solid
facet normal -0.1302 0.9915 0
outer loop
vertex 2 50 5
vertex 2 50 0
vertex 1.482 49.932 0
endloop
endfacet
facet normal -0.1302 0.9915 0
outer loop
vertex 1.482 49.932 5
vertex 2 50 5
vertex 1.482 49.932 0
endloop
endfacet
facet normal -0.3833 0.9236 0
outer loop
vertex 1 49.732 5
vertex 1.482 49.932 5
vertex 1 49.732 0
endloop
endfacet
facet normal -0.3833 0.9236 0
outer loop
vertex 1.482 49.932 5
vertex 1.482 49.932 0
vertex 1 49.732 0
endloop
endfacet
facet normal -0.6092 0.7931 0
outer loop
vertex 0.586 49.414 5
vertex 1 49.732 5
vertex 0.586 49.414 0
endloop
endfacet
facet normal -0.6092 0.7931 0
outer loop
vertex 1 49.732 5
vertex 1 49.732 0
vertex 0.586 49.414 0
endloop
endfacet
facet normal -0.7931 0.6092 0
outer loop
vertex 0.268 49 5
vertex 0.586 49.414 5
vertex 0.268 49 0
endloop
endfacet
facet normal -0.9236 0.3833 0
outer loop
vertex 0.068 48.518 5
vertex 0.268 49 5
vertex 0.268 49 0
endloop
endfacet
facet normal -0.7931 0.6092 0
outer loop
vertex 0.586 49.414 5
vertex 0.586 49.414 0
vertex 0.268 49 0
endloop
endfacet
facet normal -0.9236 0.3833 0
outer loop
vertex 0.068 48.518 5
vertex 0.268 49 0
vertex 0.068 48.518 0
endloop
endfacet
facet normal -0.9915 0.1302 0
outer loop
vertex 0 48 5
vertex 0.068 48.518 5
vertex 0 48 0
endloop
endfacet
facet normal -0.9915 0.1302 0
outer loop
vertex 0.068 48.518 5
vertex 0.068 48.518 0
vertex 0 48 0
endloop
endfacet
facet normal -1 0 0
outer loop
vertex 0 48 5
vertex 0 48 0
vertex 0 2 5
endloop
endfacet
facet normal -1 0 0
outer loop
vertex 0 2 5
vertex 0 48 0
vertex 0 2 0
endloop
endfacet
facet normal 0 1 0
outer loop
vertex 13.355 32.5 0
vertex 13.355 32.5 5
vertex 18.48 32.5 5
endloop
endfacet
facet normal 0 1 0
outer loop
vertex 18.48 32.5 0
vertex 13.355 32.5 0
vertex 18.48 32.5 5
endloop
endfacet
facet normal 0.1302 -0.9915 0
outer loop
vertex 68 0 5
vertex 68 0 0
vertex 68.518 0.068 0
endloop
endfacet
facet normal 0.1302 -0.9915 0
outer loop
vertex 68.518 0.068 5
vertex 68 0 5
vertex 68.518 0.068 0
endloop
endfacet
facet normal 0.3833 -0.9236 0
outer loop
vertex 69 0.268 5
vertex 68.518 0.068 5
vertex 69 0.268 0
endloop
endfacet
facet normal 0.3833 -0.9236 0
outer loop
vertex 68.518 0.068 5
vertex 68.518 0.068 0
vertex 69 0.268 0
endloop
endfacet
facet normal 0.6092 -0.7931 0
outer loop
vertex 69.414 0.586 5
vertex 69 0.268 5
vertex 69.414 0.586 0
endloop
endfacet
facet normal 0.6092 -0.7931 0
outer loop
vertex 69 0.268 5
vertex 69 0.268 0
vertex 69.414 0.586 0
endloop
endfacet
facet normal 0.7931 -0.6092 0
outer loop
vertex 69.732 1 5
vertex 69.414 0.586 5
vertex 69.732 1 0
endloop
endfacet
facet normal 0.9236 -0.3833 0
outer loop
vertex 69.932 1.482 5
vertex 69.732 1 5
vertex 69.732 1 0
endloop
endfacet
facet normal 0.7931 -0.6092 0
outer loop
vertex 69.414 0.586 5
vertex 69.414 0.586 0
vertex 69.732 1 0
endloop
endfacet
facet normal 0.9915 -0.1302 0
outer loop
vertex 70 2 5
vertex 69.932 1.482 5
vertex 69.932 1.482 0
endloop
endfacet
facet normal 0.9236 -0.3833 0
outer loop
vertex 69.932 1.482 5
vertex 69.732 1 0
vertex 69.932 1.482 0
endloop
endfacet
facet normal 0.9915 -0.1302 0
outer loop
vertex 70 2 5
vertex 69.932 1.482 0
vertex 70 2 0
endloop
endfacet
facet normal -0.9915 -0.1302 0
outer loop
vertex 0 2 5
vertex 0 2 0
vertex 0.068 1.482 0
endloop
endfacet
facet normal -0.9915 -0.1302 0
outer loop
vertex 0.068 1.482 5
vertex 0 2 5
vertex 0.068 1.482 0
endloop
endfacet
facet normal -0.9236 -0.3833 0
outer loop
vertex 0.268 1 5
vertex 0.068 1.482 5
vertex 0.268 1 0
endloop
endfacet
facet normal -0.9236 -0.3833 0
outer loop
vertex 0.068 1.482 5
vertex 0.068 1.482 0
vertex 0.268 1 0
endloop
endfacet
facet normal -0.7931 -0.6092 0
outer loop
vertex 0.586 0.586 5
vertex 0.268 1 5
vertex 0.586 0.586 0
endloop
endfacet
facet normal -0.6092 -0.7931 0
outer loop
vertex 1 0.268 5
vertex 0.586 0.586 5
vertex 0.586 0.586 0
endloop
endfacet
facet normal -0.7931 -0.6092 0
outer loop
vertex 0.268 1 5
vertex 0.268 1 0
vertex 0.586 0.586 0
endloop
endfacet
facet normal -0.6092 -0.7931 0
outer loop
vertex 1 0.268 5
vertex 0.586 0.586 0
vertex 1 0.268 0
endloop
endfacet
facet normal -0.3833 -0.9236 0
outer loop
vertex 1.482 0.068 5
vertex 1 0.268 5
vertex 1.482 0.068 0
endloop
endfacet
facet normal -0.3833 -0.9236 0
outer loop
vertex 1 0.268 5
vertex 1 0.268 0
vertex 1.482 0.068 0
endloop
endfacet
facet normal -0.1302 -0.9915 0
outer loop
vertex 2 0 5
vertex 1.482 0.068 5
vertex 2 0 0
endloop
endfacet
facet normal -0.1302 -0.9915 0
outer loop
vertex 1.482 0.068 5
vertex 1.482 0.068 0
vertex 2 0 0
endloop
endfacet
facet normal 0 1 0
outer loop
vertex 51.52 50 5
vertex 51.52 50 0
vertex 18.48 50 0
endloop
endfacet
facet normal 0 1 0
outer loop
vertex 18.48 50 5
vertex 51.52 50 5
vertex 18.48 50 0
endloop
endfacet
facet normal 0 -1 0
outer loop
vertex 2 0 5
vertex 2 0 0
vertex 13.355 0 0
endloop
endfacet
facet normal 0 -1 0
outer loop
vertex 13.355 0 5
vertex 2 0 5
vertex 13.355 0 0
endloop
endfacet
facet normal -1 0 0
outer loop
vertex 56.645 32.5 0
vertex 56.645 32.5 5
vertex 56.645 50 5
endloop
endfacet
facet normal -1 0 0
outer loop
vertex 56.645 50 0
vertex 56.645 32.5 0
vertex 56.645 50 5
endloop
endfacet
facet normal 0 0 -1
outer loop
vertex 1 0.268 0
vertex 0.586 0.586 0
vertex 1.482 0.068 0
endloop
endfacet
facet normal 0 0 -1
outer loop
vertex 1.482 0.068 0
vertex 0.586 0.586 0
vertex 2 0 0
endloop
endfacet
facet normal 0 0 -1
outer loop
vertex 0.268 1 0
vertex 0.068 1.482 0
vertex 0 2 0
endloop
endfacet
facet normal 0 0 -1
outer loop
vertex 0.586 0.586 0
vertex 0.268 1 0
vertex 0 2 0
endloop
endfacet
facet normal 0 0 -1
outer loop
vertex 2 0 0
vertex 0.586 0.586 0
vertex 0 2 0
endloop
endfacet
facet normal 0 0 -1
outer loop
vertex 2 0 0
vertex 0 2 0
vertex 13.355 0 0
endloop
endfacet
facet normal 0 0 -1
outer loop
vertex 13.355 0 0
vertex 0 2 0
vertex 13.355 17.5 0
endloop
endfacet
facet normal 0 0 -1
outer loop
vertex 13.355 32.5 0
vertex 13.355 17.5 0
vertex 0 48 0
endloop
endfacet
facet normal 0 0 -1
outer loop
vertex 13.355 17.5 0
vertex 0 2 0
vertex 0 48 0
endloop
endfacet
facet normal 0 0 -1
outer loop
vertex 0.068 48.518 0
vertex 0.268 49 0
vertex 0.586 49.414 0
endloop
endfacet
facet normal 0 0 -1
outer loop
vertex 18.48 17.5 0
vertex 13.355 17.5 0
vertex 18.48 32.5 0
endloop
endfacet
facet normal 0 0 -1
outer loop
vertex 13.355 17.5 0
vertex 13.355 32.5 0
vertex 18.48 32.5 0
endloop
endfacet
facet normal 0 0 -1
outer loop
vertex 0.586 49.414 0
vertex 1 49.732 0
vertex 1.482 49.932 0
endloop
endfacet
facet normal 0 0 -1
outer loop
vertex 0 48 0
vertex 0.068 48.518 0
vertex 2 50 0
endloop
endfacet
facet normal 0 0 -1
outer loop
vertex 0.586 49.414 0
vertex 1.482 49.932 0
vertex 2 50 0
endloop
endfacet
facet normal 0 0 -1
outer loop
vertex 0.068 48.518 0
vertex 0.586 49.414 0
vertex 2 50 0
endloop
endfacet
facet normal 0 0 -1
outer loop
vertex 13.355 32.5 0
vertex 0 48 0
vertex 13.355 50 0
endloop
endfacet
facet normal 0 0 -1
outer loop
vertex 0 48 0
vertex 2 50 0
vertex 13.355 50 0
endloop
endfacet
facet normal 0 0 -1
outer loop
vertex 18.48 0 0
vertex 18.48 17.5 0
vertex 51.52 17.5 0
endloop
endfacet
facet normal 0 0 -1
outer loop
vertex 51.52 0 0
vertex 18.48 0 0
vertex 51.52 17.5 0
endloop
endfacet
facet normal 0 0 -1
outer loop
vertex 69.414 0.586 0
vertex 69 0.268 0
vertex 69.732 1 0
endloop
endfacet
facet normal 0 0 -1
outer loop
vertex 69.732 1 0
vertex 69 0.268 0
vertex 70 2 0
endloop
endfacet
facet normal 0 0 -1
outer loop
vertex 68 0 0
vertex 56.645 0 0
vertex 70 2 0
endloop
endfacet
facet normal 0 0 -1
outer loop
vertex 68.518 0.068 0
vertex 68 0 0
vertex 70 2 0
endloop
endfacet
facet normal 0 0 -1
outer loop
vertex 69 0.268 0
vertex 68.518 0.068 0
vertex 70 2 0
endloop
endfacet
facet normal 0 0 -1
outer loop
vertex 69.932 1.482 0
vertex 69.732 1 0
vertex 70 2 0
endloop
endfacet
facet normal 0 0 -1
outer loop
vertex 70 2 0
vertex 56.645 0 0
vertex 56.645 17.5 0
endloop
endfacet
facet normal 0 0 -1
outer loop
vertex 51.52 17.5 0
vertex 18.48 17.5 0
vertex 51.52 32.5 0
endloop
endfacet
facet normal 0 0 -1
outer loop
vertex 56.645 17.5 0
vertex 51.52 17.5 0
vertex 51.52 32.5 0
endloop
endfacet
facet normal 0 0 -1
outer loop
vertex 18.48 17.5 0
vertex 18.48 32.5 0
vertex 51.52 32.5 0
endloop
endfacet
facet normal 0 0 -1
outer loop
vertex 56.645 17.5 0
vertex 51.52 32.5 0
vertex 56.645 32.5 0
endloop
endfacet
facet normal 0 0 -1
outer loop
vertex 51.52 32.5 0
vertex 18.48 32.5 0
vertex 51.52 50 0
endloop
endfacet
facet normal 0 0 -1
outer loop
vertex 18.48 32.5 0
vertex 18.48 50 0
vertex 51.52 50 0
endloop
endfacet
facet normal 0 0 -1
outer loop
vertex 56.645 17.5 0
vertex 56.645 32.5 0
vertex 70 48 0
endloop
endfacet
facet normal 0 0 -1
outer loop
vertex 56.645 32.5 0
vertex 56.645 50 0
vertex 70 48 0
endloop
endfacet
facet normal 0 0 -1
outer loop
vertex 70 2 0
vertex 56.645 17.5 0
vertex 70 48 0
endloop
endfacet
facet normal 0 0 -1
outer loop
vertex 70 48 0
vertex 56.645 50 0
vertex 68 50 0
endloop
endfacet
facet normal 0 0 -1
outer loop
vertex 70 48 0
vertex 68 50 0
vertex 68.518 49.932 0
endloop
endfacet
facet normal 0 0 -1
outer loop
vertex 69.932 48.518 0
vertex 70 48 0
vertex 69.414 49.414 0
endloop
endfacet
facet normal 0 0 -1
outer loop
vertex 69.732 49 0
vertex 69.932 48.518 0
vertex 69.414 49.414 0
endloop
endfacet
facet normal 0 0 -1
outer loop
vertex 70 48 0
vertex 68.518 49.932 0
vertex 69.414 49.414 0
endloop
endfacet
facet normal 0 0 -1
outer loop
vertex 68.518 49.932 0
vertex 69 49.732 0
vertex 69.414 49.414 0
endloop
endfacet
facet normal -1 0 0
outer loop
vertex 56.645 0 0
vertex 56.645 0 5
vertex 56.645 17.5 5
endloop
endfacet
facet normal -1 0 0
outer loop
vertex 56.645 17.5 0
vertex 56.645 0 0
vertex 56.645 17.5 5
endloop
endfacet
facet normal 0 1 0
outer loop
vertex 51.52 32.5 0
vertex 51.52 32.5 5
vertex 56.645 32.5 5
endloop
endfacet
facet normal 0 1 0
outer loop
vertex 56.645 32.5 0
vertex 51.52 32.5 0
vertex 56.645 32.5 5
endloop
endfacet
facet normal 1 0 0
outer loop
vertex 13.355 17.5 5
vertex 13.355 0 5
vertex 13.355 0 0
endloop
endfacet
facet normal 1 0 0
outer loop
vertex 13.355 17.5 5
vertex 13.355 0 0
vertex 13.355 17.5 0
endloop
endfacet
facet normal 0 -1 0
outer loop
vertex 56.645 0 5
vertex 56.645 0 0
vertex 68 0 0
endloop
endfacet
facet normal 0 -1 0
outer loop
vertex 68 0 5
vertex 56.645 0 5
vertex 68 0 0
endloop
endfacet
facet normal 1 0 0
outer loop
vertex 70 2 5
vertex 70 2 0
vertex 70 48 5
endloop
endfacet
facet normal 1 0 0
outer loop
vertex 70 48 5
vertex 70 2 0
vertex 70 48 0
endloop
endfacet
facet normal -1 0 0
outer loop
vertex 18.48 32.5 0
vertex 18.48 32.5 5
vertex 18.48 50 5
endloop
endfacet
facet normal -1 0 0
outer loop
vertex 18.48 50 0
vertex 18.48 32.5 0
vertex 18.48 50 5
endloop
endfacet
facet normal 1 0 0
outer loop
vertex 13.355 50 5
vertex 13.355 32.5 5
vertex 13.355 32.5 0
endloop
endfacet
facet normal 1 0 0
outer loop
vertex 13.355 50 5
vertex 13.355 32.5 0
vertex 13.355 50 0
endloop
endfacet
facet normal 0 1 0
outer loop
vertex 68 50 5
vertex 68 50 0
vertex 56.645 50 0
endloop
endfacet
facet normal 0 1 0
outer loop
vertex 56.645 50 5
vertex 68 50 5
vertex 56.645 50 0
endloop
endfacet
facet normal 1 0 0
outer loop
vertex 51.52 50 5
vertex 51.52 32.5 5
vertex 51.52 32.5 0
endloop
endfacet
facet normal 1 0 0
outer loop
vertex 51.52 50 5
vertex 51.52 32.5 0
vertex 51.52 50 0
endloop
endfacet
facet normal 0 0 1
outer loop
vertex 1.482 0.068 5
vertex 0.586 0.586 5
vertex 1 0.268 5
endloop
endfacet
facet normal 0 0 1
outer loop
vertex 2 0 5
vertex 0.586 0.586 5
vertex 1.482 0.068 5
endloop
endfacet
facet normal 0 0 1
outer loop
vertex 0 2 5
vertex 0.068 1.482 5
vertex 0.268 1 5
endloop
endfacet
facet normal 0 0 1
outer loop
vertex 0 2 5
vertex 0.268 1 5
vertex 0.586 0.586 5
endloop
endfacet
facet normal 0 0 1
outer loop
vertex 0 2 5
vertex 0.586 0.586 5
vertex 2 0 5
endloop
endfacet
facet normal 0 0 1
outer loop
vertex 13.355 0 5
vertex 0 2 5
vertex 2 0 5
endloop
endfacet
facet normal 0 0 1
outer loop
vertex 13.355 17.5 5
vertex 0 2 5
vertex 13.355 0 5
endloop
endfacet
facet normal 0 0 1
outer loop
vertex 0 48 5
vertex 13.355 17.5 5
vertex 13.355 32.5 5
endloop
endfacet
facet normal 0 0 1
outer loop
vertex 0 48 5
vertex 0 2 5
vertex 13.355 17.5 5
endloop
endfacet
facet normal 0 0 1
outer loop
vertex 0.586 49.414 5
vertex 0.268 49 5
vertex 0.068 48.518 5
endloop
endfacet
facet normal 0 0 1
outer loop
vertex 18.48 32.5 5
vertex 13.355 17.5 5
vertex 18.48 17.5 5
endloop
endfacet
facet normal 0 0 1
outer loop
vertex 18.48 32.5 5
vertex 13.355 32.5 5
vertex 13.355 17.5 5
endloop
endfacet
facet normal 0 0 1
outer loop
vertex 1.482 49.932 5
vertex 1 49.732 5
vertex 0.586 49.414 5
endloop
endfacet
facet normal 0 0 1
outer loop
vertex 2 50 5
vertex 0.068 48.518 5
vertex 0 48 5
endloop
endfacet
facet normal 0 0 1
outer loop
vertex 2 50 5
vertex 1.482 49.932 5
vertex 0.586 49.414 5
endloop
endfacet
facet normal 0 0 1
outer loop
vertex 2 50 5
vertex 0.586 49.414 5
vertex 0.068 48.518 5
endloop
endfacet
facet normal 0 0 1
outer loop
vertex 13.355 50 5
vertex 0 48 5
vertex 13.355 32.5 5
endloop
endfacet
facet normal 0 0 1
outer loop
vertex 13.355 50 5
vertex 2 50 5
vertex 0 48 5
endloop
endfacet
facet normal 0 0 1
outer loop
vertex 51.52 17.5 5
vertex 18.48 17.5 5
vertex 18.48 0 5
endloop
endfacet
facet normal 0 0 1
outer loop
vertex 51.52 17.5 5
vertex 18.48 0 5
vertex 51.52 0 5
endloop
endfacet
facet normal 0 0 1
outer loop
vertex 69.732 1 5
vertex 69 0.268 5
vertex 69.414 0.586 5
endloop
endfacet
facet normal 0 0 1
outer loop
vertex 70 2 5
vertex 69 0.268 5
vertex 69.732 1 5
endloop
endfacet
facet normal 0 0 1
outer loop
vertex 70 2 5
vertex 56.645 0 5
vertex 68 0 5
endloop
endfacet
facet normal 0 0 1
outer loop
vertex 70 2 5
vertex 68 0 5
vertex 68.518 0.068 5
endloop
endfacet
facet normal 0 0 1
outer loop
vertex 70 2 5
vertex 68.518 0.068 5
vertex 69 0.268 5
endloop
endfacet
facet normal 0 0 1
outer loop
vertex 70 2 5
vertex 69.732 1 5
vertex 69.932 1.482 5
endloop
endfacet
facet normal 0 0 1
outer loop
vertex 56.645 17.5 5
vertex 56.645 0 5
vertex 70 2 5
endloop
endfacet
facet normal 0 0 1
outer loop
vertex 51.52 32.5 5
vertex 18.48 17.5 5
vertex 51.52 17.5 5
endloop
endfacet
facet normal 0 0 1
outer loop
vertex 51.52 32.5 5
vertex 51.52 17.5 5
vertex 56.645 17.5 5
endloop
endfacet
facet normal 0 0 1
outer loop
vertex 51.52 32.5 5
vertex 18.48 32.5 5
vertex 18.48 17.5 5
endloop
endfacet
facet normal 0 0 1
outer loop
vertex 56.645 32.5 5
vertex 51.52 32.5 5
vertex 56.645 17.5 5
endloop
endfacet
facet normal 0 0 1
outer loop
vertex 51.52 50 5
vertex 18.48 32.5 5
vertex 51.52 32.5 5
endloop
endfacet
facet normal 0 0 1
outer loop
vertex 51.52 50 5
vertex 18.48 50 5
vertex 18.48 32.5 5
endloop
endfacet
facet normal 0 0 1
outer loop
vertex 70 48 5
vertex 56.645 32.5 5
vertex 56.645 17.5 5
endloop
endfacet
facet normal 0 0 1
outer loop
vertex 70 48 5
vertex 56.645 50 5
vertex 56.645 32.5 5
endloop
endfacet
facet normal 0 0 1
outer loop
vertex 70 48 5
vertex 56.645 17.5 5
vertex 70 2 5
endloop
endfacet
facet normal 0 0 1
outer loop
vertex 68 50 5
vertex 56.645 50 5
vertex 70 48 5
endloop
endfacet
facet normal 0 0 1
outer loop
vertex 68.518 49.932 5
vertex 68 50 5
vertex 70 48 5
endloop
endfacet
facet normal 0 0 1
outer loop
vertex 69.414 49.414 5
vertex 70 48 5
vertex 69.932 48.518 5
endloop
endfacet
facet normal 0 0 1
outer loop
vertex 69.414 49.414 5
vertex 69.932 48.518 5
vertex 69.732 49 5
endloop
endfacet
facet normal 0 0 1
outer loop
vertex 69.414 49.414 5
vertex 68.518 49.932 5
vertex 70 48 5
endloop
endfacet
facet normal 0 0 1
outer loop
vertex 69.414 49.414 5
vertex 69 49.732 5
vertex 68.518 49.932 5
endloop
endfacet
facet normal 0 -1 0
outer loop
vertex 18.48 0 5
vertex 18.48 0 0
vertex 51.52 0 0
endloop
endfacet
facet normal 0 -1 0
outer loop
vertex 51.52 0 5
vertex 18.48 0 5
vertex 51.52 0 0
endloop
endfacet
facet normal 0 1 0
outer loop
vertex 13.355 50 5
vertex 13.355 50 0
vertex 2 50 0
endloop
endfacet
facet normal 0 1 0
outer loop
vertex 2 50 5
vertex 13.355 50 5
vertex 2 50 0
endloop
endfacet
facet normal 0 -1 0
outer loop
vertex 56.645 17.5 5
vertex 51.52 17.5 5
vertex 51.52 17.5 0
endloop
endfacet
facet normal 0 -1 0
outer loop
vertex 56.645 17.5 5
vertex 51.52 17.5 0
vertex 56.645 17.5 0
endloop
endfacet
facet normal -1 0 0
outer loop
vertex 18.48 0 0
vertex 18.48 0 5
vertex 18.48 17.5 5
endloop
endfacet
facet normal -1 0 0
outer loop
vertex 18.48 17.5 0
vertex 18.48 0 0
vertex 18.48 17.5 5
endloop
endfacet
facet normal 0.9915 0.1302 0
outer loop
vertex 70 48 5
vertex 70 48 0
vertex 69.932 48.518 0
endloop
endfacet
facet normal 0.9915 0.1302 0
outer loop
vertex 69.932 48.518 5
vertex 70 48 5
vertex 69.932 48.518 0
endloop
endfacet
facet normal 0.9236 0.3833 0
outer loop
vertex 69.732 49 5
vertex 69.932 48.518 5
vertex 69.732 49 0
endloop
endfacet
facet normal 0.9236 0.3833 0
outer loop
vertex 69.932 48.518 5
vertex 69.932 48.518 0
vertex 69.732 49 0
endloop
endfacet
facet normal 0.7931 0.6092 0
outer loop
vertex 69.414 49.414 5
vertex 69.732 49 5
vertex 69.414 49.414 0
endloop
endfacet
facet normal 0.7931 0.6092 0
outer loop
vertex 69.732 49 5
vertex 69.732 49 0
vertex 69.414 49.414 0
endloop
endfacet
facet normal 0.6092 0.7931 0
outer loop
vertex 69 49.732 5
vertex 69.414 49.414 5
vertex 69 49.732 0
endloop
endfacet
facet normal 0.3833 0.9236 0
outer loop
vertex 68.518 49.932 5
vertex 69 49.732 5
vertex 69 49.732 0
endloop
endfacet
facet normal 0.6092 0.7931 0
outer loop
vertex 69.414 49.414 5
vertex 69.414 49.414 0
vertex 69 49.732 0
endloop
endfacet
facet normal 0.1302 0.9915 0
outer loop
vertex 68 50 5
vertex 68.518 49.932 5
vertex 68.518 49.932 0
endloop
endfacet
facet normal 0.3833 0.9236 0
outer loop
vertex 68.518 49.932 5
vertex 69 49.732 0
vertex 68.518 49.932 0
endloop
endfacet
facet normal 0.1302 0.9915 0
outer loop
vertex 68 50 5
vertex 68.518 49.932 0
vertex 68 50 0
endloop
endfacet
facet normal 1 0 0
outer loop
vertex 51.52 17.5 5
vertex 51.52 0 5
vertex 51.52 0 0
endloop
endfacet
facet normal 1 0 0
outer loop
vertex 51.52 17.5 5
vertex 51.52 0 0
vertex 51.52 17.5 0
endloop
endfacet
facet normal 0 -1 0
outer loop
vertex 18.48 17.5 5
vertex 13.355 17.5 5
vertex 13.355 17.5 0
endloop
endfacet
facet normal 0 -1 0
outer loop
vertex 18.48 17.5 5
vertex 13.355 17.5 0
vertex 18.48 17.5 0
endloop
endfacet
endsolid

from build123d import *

# Parameters (mm, degrees)
BOSS_EXTRUDE1_DEPTH = 5
SKETCH2_W           = 5.125
SKETCH2_H           = 17.5
CUT_EXTRUDE1_DEPTH  = 5


with BuildPart() as part:
    # Sketch1 → Boss-Extrude1 (new body)
    with BuildSketch(Plane.XY):
        with BuildLine():
            Line((2, 0), (68, 0))
            ThreePointArc((68, 0), (69.414213562, 0.585786438), (70, 2))
            Line((70, 2), (70, 48))
            ThreePointArc((70, 48), (69.414213562, 49.414213562), (68, 50))
            Line((68, 50), (2, 50))
            ThreePointArc((2, 50), (0.585786438, 49.414213562), (0, 48))
            Line((0, 48), (0, 2))
            ThreePointArc((0, 2), (0.585786438, 0.585786438), (2, 0))
        make_face()
    extrude(amount=BOSS_EXTRUDE1_DEPTH)

    # Sketch2 → Cut-Extrude1 (cut)
    with BuildSketch(Plane(origin=(-23.39926368, 94.916866164, 5), x_dir=(1, 0, 0), z_dir=(0, 0, 1))):
        with Locations((39.316333928, -53.666866164)):
            Rectangle(SKETCH2_W, SKETCH2_H)
        with Locations((77.482193432, -53.666866164)):
            Rectangle(SKETCH2_W, SKETCH2_H)
        with Locations((39.316333928, -86.166866164)):
            Rectangle(SKETCH2_W, SKETCH2_H)
        with Locations((77.482193432, -86.166866164)):
            Rectangle(SKETCH2_W, SKETCH2_H)
    extrude(amount=-CUT_EXTRUDE1_DEPTH, mode=Mode.SUBTRACT)


solid = part.part
